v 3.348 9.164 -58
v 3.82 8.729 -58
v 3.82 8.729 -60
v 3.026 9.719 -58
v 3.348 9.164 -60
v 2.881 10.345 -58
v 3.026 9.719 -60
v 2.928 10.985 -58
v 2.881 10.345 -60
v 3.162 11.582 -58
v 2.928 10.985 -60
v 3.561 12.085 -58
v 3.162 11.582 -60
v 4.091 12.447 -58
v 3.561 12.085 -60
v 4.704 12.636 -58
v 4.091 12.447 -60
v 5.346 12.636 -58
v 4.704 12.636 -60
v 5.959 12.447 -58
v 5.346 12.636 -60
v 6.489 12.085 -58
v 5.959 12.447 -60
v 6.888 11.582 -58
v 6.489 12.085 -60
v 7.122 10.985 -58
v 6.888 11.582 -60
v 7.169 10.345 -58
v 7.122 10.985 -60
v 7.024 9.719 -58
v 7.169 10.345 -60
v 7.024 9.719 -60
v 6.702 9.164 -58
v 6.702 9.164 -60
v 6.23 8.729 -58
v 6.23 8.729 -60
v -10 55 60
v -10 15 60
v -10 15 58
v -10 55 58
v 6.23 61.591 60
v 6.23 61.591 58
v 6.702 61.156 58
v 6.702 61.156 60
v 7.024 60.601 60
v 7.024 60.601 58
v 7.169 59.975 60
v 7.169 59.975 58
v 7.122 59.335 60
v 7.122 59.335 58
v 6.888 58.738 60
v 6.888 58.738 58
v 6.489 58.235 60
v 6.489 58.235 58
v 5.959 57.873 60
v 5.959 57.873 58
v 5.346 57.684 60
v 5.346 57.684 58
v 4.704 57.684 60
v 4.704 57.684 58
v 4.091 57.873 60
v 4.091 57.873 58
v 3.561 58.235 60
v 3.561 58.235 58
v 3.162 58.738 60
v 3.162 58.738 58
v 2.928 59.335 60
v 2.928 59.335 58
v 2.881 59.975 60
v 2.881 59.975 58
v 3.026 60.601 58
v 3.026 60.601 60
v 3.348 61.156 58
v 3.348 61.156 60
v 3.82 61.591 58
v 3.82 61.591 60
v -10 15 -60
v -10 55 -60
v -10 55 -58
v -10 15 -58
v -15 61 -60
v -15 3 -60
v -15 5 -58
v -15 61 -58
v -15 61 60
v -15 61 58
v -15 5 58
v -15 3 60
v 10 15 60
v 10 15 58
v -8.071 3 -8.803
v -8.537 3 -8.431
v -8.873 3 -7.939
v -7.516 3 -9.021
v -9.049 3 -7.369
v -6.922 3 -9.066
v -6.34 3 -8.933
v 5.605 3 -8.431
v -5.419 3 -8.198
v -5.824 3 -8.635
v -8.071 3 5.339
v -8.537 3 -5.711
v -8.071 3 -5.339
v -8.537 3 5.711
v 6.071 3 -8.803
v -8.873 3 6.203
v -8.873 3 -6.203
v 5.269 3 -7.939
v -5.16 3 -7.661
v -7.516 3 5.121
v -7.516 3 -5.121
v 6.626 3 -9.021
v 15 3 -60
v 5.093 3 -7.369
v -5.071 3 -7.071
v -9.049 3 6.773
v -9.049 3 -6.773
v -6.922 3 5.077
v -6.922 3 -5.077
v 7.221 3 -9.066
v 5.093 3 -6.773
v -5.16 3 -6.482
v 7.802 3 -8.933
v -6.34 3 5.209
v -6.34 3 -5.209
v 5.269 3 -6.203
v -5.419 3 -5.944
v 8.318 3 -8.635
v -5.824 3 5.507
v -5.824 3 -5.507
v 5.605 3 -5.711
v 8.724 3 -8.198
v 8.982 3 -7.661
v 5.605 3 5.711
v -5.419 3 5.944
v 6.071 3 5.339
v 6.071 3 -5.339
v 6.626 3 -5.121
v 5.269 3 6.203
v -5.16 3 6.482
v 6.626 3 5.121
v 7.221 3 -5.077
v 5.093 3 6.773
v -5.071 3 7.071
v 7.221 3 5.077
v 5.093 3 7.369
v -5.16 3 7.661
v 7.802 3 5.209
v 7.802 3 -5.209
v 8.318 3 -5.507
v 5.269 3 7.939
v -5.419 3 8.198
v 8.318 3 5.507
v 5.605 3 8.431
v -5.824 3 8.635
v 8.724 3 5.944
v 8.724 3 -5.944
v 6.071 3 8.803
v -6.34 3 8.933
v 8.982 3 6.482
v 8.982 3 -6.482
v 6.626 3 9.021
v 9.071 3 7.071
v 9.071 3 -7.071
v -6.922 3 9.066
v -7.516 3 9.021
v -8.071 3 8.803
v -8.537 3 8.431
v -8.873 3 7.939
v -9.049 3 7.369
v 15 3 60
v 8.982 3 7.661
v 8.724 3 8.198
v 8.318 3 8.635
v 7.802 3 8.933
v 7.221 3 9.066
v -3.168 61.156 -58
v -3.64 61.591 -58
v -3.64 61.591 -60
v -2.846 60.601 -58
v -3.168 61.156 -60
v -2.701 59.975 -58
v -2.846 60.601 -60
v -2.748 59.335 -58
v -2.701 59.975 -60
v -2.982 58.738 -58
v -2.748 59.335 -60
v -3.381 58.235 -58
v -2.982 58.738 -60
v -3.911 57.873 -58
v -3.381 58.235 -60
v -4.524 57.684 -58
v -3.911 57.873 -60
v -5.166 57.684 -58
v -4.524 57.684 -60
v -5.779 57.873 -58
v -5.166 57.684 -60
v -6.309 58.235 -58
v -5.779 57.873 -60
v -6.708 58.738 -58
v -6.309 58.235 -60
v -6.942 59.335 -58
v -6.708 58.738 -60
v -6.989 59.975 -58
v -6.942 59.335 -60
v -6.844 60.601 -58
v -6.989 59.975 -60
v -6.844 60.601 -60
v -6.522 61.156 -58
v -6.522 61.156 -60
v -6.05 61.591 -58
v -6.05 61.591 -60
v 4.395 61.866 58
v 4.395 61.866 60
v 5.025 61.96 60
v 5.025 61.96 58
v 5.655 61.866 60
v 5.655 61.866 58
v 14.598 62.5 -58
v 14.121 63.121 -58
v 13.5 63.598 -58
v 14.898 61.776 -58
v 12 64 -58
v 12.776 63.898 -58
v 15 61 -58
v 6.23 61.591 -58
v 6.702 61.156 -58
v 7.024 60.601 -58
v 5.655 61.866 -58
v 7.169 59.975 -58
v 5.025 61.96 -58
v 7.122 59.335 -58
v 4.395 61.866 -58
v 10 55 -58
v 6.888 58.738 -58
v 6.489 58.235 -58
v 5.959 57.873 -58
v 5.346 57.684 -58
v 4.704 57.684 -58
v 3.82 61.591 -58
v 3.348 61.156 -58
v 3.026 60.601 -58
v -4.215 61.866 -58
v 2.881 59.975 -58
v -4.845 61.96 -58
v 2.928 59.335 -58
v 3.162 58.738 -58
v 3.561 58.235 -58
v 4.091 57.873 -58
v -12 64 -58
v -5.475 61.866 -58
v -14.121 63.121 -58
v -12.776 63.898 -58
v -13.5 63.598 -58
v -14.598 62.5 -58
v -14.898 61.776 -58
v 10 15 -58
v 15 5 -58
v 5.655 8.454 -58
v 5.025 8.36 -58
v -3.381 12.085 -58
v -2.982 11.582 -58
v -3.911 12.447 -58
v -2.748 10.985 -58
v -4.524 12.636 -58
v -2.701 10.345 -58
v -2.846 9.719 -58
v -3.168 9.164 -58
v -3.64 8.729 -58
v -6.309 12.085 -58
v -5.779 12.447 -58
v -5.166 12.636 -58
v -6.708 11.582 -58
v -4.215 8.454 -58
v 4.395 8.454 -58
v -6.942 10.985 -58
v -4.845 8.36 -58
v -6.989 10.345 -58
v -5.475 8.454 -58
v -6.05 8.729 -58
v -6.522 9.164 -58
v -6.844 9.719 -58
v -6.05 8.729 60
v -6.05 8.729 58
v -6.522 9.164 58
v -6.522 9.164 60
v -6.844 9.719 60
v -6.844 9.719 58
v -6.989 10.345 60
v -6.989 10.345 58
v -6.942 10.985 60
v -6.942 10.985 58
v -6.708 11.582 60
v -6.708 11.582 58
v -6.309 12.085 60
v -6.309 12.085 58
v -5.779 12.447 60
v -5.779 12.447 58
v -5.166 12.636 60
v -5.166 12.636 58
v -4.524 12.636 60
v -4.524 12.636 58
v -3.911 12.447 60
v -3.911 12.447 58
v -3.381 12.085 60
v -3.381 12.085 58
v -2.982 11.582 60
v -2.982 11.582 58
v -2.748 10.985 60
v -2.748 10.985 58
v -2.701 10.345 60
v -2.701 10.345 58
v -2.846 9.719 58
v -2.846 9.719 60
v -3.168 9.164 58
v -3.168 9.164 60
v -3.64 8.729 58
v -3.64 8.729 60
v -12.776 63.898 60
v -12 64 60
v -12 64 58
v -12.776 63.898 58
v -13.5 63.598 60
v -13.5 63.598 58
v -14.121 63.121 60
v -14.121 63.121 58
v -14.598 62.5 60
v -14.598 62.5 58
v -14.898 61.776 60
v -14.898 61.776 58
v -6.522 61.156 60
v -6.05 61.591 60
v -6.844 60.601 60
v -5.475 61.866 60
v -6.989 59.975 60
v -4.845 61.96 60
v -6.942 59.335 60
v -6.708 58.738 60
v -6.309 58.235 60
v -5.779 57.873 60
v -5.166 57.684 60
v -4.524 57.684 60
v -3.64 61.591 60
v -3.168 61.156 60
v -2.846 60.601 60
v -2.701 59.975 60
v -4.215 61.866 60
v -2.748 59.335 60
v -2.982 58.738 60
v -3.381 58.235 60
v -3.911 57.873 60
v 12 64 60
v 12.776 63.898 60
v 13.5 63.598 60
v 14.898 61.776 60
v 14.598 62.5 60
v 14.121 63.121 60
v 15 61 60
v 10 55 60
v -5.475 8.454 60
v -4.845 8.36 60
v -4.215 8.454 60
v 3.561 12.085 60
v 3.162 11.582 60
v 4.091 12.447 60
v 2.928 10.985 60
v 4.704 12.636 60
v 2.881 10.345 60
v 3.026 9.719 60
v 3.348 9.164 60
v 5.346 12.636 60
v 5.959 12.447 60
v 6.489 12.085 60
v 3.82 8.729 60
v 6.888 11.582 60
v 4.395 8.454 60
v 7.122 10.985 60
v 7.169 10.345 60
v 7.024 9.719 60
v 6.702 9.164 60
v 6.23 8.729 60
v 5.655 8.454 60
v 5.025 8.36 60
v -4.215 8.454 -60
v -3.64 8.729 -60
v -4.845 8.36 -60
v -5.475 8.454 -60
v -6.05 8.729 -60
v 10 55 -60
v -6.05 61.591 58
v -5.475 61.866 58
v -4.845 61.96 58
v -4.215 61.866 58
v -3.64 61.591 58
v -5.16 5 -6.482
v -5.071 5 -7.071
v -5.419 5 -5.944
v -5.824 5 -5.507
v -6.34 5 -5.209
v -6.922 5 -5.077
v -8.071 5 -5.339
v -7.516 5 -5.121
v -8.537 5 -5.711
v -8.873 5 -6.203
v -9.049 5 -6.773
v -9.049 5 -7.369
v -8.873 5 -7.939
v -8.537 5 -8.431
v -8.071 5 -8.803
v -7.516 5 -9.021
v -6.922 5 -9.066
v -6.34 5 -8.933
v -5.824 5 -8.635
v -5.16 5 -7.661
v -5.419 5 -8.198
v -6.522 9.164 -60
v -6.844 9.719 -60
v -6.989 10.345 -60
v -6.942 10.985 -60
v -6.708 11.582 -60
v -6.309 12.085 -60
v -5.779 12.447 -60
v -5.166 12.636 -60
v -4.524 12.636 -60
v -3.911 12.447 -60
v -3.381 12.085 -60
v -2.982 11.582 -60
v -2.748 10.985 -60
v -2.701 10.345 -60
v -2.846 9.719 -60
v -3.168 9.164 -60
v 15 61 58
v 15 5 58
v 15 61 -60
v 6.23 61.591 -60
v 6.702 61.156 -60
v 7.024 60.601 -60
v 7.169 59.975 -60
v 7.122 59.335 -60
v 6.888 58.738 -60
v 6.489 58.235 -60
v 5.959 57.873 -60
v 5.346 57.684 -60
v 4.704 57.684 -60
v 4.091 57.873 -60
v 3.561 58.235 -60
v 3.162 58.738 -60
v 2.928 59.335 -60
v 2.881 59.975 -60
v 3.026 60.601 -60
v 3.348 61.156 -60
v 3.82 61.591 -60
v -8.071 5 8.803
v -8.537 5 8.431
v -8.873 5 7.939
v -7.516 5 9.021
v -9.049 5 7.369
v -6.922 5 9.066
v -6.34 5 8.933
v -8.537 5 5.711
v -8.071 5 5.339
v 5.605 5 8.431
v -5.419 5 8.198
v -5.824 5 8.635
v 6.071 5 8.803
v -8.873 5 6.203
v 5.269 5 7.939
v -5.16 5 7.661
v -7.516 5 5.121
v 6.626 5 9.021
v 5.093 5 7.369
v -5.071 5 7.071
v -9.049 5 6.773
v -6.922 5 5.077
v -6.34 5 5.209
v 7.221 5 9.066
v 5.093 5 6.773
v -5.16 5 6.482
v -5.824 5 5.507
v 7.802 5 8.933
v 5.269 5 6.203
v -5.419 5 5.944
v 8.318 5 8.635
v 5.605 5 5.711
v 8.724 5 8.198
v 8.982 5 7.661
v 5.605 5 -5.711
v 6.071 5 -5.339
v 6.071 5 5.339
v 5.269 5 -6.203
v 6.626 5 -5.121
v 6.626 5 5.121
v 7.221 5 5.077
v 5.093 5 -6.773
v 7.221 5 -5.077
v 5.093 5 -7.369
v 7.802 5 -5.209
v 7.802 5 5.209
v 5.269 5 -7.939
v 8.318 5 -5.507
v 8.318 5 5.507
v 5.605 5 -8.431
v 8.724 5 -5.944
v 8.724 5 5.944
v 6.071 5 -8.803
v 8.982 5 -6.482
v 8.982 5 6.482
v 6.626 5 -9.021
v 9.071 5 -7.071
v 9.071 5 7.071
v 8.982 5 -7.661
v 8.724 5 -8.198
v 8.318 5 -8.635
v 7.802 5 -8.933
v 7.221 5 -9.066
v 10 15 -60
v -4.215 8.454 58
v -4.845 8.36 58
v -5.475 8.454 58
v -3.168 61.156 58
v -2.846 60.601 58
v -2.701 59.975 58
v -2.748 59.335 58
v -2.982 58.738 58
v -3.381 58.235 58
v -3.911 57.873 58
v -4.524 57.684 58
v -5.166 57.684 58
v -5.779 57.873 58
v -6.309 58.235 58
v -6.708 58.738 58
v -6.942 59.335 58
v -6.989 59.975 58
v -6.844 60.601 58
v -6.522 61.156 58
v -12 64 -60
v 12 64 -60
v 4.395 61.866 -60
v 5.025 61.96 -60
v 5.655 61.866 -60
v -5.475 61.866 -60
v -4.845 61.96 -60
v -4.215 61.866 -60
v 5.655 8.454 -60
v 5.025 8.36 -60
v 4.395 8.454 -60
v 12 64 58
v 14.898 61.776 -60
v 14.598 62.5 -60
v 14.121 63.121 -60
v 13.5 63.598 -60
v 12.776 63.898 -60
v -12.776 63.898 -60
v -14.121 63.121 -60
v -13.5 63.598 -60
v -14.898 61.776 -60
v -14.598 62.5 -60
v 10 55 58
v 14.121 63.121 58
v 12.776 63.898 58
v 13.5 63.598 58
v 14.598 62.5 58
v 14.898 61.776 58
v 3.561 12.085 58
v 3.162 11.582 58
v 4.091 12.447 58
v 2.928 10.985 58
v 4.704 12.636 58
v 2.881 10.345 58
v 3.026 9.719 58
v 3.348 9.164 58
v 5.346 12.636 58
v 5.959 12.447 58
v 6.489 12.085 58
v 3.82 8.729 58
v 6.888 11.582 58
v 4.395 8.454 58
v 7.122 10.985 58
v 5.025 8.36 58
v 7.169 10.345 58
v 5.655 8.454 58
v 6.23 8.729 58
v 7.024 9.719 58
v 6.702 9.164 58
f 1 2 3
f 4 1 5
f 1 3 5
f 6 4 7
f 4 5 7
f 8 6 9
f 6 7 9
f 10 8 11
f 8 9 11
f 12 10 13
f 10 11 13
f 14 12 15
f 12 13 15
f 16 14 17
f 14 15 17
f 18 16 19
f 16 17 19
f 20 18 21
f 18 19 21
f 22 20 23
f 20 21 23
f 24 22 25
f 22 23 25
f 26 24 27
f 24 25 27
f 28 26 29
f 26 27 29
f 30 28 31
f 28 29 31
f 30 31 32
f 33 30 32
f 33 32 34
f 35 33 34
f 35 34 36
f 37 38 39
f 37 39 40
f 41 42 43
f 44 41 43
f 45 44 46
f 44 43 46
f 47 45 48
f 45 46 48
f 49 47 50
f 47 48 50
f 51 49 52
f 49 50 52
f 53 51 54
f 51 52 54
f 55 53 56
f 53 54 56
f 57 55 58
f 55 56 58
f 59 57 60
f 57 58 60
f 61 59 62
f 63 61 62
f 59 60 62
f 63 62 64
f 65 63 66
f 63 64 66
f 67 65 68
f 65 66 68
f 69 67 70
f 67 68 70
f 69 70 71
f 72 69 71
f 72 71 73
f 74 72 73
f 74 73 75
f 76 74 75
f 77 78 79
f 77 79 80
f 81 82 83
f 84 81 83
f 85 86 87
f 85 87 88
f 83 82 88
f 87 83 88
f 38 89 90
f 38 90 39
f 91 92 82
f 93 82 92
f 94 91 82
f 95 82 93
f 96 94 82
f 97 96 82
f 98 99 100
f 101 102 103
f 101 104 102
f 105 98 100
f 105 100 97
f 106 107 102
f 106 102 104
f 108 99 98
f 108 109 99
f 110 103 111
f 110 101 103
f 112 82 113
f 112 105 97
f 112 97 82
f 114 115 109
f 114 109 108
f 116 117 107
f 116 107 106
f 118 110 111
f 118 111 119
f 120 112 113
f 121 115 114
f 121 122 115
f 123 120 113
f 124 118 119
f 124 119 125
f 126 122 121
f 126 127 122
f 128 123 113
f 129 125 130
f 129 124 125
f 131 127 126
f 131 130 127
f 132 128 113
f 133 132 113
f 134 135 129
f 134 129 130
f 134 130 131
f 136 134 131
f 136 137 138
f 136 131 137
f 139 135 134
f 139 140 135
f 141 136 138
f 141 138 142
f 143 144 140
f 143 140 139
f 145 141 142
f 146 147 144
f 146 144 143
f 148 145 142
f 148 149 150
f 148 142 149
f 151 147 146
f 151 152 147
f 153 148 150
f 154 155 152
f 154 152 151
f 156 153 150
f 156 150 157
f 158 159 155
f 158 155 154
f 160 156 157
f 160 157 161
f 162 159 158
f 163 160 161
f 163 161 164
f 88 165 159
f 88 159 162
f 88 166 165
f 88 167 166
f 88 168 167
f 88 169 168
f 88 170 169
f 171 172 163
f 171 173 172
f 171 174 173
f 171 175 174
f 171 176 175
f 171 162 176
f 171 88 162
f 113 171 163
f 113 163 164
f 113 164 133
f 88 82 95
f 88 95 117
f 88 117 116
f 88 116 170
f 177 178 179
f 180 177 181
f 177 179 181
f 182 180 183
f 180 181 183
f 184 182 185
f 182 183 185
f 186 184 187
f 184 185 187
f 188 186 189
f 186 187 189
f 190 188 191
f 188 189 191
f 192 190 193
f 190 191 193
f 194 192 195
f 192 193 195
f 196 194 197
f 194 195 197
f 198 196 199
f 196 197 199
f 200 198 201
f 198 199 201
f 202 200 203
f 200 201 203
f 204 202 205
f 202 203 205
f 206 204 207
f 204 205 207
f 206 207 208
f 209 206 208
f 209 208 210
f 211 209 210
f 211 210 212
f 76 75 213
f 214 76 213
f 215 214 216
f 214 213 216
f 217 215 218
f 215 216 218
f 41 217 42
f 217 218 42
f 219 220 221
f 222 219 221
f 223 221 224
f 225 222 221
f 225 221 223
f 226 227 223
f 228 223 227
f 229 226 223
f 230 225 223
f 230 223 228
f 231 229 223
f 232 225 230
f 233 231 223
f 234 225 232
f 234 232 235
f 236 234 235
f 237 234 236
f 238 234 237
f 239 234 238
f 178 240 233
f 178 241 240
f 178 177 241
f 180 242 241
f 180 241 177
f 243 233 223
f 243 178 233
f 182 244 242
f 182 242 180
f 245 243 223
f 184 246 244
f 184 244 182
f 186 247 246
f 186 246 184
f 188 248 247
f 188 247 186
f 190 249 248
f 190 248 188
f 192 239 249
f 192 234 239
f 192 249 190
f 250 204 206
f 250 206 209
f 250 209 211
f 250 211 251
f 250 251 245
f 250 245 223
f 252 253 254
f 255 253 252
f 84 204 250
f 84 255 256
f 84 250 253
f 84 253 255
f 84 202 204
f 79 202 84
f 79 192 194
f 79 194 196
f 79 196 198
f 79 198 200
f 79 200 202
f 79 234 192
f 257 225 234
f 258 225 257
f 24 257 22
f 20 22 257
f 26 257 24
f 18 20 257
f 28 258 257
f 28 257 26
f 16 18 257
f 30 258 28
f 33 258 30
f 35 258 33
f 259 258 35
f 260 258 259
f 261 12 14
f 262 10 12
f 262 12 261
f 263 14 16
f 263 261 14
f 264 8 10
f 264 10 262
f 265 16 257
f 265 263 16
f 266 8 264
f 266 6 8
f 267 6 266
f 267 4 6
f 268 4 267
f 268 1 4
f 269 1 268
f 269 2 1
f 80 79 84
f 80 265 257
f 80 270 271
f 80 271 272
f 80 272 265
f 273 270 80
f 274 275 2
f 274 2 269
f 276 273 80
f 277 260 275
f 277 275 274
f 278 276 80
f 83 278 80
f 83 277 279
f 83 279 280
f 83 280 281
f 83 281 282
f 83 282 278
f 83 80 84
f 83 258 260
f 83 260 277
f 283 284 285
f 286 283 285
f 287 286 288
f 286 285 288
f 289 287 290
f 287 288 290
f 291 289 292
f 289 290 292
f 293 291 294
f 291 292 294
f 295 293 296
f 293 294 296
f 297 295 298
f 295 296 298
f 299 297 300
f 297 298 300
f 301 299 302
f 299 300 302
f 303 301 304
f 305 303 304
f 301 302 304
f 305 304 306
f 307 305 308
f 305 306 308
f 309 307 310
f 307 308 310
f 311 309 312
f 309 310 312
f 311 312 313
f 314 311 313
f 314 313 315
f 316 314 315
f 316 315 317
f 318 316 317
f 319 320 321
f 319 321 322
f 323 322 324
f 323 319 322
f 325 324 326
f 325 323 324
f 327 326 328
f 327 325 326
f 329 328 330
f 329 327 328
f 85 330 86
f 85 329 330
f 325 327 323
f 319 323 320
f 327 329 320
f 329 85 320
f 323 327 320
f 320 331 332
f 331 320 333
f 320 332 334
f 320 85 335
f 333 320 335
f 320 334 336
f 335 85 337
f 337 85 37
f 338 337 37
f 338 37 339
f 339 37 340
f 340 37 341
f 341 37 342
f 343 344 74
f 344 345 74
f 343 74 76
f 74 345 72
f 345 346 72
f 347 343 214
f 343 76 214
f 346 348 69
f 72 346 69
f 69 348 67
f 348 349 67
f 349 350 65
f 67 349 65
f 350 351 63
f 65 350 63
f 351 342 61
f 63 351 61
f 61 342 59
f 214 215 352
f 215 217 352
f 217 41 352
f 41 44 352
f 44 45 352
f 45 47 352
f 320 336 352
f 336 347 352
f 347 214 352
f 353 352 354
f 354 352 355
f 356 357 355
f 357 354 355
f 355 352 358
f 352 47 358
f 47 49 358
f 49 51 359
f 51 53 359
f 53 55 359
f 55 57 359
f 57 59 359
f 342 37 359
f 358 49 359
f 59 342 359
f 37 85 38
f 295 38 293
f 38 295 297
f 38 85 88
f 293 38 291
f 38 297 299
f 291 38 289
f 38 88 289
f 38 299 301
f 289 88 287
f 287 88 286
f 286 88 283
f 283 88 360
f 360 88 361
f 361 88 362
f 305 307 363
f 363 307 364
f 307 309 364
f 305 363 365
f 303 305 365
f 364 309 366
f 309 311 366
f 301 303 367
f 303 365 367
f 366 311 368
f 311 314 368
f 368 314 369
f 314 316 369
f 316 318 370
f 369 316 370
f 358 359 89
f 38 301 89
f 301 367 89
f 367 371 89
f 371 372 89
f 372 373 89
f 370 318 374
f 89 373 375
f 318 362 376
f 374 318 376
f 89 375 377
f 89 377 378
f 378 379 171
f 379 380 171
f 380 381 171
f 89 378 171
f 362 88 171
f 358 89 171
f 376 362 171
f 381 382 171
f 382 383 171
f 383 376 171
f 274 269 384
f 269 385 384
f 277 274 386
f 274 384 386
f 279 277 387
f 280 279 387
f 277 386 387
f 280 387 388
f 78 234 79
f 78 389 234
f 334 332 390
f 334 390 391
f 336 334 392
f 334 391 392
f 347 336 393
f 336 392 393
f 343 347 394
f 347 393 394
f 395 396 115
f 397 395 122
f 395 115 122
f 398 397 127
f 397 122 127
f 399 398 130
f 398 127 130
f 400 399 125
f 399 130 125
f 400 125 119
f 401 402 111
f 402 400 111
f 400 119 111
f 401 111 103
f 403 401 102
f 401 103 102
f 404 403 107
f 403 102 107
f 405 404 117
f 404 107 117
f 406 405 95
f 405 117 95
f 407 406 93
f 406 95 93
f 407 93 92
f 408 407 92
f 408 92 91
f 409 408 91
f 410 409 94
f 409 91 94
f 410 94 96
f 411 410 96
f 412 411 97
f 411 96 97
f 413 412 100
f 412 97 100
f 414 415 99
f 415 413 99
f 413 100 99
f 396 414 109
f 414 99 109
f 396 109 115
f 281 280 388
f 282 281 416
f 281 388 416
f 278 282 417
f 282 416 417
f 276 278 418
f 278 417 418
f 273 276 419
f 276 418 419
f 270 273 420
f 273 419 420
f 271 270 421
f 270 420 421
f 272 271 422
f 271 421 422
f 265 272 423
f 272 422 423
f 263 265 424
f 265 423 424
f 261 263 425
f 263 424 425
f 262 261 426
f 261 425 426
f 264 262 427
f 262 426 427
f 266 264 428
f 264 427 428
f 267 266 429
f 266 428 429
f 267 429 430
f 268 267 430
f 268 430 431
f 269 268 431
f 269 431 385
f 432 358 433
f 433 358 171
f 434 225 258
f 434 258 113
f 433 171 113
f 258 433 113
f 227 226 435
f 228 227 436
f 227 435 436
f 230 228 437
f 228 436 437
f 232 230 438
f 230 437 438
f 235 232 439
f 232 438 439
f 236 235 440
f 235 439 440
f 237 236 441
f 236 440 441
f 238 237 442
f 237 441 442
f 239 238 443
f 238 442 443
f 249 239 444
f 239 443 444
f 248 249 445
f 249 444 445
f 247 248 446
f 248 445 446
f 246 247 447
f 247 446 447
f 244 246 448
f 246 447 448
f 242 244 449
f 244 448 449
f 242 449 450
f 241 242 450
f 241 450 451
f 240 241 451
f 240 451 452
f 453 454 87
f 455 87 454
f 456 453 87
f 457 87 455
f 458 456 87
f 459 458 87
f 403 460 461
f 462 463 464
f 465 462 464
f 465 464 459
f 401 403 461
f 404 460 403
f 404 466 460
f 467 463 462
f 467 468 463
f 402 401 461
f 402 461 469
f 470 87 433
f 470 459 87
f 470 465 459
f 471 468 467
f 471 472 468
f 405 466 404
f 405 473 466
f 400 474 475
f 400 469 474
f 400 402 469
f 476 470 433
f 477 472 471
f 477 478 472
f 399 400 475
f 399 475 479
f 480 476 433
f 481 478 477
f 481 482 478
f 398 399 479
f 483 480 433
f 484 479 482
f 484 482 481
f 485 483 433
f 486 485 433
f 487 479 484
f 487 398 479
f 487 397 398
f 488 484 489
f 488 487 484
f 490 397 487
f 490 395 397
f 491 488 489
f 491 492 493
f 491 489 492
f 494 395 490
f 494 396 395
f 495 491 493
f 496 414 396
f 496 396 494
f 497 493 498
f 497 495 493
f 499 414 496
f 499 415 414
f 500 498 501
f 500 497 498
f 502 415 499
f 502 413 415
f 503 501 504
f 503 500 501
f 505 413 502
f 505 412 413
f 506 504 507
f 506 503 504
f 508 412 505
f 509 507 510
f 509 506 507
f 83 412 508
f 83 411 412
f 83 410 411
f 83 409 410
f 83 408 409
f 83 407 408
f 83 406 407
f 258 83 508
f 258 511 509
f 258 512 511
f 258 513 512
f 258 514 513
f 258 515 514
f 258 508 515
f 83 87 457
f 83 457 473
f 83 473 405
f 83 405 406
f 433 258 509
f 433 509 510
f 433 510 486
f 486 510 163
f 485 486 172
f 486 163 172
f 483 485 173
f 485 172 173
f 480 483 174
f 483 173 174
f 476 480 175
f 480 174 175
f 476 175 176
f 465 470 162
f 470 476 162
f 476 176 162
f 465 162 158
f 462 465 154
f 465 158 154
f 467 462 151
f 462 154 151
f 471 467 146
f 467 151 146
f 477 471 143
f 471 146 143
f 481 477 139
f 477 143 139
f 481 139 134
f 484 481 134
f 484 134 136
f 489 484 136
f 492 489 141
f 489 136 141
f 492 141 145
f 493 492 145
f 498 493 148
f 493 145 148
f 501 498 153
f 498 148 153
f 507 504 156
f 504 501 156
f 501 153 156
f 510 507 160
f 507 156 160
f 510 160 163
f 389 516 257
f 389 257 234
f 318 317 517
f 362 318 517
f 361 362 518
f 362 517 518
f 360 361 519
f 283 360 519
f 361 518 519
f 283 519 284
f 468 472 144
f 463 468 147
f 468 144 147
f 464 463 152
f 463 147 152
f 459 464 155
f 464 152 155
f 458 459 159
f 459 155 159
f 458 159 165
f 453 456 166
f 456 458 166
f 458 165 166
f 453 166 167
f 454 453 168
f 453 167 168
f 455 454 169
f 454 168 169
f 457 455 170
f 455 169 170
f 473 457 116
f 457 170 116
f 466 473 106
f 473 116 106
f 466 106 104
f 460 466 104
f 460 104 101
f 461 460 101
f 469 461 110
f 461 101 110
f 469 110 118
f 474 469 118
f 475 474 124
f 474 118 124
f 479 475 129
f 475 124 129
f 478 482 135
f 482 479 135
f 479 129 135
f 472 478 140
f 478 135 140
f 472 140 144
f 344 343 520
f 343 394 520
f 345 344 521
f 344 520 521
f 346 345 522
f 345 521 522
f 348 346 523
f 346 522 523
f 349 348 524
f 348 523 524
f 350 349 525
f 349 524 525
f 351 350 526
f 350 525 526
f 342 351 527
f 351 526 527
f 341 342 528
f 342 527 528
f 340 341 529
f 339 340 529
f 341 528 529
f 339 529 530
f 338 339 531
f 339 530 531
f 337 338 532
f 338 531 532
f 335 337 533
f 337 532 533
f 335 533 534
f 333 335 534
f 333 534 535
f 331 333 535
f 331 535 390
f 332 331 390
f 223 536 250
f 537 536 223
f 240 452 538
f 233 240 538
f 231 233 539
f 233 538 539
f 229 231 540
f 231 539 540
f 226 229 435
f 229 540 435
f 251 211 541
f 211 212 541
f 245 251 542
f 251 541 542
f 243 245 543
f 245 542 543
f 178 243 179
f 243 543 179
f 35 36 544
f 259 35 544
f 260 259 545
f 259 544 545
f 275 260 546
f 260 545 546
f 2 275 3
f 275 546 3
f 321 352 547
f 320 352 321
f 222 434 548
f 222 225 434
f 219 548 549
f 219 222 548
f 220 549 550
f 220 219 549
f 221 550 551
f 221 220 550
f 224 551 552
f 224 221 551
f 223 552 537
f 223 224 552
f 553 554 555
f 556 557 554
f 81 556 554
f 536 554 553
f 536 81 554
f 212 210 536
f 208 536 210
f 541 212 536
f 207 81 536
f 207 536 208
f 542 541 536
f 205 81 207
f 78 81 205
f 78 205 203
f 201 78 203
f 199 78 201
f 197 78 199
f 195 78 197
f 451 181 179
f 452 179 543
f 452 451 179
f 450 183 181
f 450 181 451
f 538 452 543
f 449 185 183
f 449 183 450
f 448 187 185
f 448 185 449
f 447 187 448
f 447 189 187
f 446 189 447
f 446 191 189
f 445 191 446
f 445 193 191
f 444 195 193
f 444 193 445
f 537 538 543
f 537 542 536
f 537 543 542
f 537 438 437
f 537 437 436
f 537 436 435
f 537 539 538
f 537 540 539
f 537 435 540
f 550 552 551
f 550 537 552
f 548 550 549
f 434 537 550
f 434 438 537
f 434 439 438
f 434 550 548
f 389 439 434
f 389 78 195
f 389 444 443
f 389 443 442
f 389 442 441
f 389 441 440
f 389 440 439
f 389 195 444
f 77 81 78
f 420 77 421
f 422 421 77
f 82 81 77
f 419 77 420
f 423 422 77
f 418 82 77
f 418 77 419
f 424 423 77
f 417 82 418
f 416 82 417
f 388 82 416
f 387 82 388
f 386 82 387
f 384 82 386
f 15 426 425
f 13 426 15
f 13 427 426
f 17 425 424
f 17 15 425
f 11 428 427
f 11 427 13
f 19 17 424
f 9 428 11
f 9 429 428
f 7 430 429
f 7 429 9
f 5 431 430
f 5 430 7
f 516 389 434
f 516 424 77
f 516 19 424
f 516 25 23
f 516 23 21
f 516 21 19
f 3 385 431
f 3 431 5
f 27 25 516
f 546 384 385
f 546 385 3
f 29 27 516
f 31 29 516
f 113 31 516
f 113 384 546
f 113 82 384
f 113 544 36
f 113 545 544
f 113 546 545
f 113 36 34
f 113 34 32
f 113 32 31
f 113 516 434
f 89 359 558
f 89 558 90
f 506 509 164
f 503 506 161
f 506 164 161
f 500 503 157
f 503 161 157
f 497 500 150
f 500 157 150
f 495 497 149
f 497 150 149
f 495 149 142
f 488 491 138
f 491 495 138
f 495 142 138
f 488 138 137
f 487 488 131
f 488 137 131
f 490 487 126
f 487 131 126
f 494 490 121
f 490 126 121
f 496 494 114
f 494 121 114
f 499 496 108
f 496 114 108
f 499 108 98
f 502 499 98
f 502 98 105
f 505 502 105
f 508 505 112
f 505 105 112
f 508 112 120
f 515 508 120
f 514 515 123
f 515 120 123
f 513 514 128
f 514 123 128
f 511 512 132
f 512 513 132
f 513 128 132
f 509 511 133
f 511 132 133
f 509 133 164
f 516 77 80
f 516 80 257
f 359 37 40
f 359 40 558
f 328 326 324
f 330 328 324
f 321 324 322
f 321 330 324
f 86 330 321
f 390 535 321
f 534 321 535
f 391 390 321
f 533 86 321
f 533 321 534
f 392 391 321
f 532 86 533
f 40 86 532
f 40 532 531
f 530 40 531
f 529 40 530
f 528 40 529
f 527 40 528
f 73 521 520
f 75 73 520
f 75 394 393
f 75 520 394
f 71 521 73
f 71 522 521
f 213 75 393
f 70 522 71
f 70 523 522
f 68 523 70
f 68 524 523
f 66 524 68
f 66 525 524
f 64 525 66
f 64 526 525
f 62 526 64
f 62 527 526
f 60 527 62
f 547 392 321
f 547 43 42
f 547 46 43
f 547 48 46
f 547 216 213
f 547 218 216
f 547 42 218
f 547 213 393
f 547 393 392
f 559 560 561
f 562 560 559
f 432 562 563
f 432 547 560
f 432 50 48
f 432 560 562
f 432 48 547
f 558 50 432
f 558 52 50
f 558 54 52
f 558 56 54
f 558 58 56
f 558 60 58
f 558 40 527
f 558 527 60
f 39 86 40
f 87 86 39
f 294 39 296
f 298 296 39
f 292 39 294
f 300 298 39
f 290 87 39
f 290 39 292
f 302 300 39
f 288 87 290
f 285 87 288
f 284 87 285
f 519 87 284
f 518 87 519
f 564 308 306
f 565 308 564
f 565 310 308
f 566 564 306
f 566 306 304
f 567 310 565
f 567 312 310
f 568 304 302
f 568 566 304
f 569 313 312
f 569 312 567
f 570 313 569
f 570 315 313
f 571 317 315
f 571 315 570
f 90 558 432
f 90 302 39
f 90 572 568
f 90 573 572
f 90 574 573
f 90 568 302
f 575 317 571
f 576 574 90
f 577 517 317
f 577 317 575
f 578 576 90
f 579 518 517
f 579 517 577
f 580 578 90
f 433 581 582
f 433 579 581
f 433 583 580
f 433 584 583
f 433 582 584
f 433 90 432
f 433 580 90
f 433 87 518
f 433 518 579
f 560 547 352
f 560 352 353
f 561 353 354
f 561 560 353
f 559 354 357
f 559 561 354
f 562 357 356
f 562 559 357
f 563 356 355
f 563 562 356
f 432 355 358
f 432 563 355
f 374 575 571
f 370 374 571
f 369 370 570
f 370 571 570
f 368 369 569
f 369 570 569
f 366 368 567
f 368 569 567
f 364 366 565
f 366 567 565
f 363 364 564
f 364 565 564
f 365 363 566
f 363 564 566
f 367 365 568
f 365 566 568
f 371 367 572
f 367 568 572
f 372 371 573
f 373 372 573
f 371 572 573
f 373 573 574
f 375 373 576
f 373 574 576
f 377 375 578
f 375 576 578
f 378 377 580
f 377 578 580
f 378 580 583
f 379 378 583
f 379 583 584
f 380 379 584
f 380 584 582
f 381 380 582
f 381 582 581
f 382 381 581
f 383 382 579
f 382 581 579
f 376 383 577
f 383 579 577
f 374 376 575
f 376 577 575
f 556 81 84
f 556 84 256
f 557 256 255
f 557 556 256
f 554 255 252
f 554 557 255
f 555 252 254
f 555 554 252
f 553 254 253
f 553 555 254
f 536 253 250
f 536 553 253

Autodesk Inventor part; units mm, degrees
ref_plane "YZ Plane" through (0, 0, 0) normal (1, 0, 0) x (0, 1, 0)
ref_plane "XZ Plane" through (0, 0, 0) normal (0, 1, 0) x (-1, 0, 0)
ref_plane "XY Plane" through (0, 0, 0) normal (0, 0, 1) x (1, 0, 0)
sketch "Sketch1" plane through (0, 0, 0) normal (0, 1, 0) x (-1, 0, 0)
  line L0 (-15, 60) -> (15, 60)
  line L1 (15, 60) -> (15, -60)
  line L2 (15, -60) -> (-15, -60)
  line L3 (-15, -60) -> (-15, 60)
  line L4 (-15, 60) -> (15, -60) construction
  line L5 (15, 60) -> (-15, -60) construction
  circle A0 centre (7.0711, -7.0711) radius 2
  line L6 (7.0711, -7.0711) -> (0, 0) construction
  circle A1 centre (0, 0) radius 65.2762 construction
  circle A2 centre (7.0711, 7.0711) radius 2
  circle A3 centre (-7.0711, 7.0711) radius 2
  circle A4 centre (-7.0711, -7.0711) radius 2
  dimension "d0" = 30
  dimension "d1" = 120
  dimension "d2" = 10
  dimension "d3" = 4
  dimension "d4" = 45
  dimension "d7" = 360
extrude "Extrusion1" add sketch "Sketch1" along normal blind 2
sketch "Sketch2" plane through (0, 2, 0) normal (0, 1, 0) x (1, 0, 0)
  line L0 (15, 60) -> (-15, 60) projected
  line L1 (-15, 60) -> (15, 60)
  line L2 (15, 60) -> (15, 58)
  line L3 (15, 58) -> (-15, 58)
  line L4 (-15, 58) -> (-15, 60)
  line L5 (15, -60) -> (15, 60) projected
  point P0 (0, 0)
  dimension "d11" = 2
extrude "Extrusion2" add sketch "Sketch2" along normal blind 62
sketch "Sketch3" plane through (15, 0, -60) normal (0, 0, -1) x (-1, 0, 0)
  line L0 (5, 55) -> (25, 55)
  line L1 (25, 55) -> (25, 15)
  line L2 (25, 15) -> (5, 15)
  line L3 (5, 15) -> (5, 55)
  line L4 (0, 0) -> (0, 64) projected
  line L5 (0, 64) -> (30, 64) projected
  point P0 (15, 0)
  dimension "d14" = 40
  dimension "d15" = 20
  dimension "d16" = 5
  dimension "d17" = 9
extrude "Extrusion3" cut sketch "Sketch3" against normal up to surface (2 mm away)
fillet "Fillet1" radius 3 2 edges at (15, 64, -59) (-15, 64, -59)
mirror "Mirror1" about plane through (0, 0, 0) normal (0, 0, 1) of "Extrusion2", "Extrusion3", "Fillet1"
sketch "Sketch4" plane through (15, 0, -60) normal (0, 0, -1) x (-1, 0, 0)
  arc A0 (21.05, 8.7294) -> (18.64, 8.7294) centre (19.845, 10.51) ccw construction
  arc A1 (11.18, 8.7294) -> (8.77, 8.7294) centre (9.975, 10.51) ccw construction
  line L0 (11.18, 8.25) -> (11.18, 8.7294) construction
  line L1 (11.18, 8.25) -> (18.64, 8.25) construction
  line L2 (18.64, 8.7294) -> (18.64, 8.25) construction
  arc A2 (21.05, 8.7294) -> (18.64, 8.7294) centre (19.845, 10.51) ccw construction
  line L3 (21.05, 8.25) -> (21.05, 8.7294) construction
  line L4 (21.05, 8.25) -> (24.13, 8.25) construction
  line L5 (24.13, 8.25) -> (24.13, 15.0287) construction
  spline S0 degree 2 poles (24.13, 15.0287) (23.9893, 15) (23.82, 15) knots 0.830662 0.830662 0.830662 1 1 1 construction
  line L6 (23.82, 15) -> (6, 15) construction
  spline S1 degree 2 poles (6, 15) (5.8307, 15) (5.69, 15.0287) knots -1 -1 -1 -0.830662 -0.830662 -0.830662 construction
  line L7 (5.69, 8.25) -> (5.69, 15.0287) construction
  line L8 (5.69, 8.25) -> (8.77, 8.25) construction
  line L9 (8.77, 8.7294) -> (8.77, 8.25) construction
  arc A3 (18.64, 61.5906) -> (21.05, 61.5906) centre (19.845, 59.81) ccw projected
  arc A4 (8.77, 61.5906) -> (11.18, 61.5906) centre (9.975, 59.81) ccw projected
  circle A5 centre (19.845, 59.81) radius 2.15
  circle A6 centre (9.975, 59.81) radius 2.15
  arc A7 (21.05, 8.7294) -> (18.64, 8.7294) centre (19.845, 10.51) ccw projected
  arc A8 (11.18, 8.7294) -> (8.77, 8.7294) centre (9.975, 10.51) ccw projected
  circle A9 centre (19.845, 10.51) radius 2.15
  circle A10 centre (9.975, 10.51) radius 2.15
  point P0 (15, 0)
  point P1 (21.05, 8.7294)
  point P2 (11.18, 8.7294)
  point P3 (21.05, 61.5906)
  point P4 (11.18, 61.5906)
extrude "Extrusion4" cut sketch "Sketch4" against normal through all
sketch "Sketch5" plane through (0, 2, 0) normal (0, 1, 0) x (1, 0, 0)
  line L0 (-15, 60) -> (-15, -60) projected
  line L1 (-15, -58) -> (15, -58) projected
  line L2 (15, -58) -> (15, 58) projected
  line L3 (15, 58) -> (-15, 58) projected
  line L4 (-15, 58) -> (-15, -58) projected
  circle A0 centre (-7.0711, 7.0711) radius 2 projected
  circle A1 centre (-7.0711, -7.0711) radius 2 projected
  circle A2 centre (7.0711, -7.0711) radius 2 projected
  circle A3 centre (7.0711, 7.0711) radius 2 projected
  point P0 (0, 0)
  point P1 (-15, 58)
extrude "Extrusion5" add sketch "Sketch5" along normal blind 3
sketch "Sketch6" plane through (0, 0, 0) normal (0, -1, 0) x (1, 0, 0)
  line L0 (15, -60) -> (-15, -60) projected
  line L1 (15, 60) -> (15, -60) projected
  line L2 (-15, 60) -> (15, 60) projected
  line L3 (-15, -60) -> (-15, 60) projected
  circle A0 centre (7.0711, -7.0711) radius 2 projected
  circle A1 centre (7.0711, 7.0711) radius 2 projected
  circle A2 centre (-7.0711, 7.0711) radius 2 projected
  circle A3 centre (-7.0711, -7.0711) radius 2 projected
  point P0 (0, 0)
extrude "Extrusion6" cut sketch "Sketch6" against normal blind 3
properties part number "new-motor-base"
